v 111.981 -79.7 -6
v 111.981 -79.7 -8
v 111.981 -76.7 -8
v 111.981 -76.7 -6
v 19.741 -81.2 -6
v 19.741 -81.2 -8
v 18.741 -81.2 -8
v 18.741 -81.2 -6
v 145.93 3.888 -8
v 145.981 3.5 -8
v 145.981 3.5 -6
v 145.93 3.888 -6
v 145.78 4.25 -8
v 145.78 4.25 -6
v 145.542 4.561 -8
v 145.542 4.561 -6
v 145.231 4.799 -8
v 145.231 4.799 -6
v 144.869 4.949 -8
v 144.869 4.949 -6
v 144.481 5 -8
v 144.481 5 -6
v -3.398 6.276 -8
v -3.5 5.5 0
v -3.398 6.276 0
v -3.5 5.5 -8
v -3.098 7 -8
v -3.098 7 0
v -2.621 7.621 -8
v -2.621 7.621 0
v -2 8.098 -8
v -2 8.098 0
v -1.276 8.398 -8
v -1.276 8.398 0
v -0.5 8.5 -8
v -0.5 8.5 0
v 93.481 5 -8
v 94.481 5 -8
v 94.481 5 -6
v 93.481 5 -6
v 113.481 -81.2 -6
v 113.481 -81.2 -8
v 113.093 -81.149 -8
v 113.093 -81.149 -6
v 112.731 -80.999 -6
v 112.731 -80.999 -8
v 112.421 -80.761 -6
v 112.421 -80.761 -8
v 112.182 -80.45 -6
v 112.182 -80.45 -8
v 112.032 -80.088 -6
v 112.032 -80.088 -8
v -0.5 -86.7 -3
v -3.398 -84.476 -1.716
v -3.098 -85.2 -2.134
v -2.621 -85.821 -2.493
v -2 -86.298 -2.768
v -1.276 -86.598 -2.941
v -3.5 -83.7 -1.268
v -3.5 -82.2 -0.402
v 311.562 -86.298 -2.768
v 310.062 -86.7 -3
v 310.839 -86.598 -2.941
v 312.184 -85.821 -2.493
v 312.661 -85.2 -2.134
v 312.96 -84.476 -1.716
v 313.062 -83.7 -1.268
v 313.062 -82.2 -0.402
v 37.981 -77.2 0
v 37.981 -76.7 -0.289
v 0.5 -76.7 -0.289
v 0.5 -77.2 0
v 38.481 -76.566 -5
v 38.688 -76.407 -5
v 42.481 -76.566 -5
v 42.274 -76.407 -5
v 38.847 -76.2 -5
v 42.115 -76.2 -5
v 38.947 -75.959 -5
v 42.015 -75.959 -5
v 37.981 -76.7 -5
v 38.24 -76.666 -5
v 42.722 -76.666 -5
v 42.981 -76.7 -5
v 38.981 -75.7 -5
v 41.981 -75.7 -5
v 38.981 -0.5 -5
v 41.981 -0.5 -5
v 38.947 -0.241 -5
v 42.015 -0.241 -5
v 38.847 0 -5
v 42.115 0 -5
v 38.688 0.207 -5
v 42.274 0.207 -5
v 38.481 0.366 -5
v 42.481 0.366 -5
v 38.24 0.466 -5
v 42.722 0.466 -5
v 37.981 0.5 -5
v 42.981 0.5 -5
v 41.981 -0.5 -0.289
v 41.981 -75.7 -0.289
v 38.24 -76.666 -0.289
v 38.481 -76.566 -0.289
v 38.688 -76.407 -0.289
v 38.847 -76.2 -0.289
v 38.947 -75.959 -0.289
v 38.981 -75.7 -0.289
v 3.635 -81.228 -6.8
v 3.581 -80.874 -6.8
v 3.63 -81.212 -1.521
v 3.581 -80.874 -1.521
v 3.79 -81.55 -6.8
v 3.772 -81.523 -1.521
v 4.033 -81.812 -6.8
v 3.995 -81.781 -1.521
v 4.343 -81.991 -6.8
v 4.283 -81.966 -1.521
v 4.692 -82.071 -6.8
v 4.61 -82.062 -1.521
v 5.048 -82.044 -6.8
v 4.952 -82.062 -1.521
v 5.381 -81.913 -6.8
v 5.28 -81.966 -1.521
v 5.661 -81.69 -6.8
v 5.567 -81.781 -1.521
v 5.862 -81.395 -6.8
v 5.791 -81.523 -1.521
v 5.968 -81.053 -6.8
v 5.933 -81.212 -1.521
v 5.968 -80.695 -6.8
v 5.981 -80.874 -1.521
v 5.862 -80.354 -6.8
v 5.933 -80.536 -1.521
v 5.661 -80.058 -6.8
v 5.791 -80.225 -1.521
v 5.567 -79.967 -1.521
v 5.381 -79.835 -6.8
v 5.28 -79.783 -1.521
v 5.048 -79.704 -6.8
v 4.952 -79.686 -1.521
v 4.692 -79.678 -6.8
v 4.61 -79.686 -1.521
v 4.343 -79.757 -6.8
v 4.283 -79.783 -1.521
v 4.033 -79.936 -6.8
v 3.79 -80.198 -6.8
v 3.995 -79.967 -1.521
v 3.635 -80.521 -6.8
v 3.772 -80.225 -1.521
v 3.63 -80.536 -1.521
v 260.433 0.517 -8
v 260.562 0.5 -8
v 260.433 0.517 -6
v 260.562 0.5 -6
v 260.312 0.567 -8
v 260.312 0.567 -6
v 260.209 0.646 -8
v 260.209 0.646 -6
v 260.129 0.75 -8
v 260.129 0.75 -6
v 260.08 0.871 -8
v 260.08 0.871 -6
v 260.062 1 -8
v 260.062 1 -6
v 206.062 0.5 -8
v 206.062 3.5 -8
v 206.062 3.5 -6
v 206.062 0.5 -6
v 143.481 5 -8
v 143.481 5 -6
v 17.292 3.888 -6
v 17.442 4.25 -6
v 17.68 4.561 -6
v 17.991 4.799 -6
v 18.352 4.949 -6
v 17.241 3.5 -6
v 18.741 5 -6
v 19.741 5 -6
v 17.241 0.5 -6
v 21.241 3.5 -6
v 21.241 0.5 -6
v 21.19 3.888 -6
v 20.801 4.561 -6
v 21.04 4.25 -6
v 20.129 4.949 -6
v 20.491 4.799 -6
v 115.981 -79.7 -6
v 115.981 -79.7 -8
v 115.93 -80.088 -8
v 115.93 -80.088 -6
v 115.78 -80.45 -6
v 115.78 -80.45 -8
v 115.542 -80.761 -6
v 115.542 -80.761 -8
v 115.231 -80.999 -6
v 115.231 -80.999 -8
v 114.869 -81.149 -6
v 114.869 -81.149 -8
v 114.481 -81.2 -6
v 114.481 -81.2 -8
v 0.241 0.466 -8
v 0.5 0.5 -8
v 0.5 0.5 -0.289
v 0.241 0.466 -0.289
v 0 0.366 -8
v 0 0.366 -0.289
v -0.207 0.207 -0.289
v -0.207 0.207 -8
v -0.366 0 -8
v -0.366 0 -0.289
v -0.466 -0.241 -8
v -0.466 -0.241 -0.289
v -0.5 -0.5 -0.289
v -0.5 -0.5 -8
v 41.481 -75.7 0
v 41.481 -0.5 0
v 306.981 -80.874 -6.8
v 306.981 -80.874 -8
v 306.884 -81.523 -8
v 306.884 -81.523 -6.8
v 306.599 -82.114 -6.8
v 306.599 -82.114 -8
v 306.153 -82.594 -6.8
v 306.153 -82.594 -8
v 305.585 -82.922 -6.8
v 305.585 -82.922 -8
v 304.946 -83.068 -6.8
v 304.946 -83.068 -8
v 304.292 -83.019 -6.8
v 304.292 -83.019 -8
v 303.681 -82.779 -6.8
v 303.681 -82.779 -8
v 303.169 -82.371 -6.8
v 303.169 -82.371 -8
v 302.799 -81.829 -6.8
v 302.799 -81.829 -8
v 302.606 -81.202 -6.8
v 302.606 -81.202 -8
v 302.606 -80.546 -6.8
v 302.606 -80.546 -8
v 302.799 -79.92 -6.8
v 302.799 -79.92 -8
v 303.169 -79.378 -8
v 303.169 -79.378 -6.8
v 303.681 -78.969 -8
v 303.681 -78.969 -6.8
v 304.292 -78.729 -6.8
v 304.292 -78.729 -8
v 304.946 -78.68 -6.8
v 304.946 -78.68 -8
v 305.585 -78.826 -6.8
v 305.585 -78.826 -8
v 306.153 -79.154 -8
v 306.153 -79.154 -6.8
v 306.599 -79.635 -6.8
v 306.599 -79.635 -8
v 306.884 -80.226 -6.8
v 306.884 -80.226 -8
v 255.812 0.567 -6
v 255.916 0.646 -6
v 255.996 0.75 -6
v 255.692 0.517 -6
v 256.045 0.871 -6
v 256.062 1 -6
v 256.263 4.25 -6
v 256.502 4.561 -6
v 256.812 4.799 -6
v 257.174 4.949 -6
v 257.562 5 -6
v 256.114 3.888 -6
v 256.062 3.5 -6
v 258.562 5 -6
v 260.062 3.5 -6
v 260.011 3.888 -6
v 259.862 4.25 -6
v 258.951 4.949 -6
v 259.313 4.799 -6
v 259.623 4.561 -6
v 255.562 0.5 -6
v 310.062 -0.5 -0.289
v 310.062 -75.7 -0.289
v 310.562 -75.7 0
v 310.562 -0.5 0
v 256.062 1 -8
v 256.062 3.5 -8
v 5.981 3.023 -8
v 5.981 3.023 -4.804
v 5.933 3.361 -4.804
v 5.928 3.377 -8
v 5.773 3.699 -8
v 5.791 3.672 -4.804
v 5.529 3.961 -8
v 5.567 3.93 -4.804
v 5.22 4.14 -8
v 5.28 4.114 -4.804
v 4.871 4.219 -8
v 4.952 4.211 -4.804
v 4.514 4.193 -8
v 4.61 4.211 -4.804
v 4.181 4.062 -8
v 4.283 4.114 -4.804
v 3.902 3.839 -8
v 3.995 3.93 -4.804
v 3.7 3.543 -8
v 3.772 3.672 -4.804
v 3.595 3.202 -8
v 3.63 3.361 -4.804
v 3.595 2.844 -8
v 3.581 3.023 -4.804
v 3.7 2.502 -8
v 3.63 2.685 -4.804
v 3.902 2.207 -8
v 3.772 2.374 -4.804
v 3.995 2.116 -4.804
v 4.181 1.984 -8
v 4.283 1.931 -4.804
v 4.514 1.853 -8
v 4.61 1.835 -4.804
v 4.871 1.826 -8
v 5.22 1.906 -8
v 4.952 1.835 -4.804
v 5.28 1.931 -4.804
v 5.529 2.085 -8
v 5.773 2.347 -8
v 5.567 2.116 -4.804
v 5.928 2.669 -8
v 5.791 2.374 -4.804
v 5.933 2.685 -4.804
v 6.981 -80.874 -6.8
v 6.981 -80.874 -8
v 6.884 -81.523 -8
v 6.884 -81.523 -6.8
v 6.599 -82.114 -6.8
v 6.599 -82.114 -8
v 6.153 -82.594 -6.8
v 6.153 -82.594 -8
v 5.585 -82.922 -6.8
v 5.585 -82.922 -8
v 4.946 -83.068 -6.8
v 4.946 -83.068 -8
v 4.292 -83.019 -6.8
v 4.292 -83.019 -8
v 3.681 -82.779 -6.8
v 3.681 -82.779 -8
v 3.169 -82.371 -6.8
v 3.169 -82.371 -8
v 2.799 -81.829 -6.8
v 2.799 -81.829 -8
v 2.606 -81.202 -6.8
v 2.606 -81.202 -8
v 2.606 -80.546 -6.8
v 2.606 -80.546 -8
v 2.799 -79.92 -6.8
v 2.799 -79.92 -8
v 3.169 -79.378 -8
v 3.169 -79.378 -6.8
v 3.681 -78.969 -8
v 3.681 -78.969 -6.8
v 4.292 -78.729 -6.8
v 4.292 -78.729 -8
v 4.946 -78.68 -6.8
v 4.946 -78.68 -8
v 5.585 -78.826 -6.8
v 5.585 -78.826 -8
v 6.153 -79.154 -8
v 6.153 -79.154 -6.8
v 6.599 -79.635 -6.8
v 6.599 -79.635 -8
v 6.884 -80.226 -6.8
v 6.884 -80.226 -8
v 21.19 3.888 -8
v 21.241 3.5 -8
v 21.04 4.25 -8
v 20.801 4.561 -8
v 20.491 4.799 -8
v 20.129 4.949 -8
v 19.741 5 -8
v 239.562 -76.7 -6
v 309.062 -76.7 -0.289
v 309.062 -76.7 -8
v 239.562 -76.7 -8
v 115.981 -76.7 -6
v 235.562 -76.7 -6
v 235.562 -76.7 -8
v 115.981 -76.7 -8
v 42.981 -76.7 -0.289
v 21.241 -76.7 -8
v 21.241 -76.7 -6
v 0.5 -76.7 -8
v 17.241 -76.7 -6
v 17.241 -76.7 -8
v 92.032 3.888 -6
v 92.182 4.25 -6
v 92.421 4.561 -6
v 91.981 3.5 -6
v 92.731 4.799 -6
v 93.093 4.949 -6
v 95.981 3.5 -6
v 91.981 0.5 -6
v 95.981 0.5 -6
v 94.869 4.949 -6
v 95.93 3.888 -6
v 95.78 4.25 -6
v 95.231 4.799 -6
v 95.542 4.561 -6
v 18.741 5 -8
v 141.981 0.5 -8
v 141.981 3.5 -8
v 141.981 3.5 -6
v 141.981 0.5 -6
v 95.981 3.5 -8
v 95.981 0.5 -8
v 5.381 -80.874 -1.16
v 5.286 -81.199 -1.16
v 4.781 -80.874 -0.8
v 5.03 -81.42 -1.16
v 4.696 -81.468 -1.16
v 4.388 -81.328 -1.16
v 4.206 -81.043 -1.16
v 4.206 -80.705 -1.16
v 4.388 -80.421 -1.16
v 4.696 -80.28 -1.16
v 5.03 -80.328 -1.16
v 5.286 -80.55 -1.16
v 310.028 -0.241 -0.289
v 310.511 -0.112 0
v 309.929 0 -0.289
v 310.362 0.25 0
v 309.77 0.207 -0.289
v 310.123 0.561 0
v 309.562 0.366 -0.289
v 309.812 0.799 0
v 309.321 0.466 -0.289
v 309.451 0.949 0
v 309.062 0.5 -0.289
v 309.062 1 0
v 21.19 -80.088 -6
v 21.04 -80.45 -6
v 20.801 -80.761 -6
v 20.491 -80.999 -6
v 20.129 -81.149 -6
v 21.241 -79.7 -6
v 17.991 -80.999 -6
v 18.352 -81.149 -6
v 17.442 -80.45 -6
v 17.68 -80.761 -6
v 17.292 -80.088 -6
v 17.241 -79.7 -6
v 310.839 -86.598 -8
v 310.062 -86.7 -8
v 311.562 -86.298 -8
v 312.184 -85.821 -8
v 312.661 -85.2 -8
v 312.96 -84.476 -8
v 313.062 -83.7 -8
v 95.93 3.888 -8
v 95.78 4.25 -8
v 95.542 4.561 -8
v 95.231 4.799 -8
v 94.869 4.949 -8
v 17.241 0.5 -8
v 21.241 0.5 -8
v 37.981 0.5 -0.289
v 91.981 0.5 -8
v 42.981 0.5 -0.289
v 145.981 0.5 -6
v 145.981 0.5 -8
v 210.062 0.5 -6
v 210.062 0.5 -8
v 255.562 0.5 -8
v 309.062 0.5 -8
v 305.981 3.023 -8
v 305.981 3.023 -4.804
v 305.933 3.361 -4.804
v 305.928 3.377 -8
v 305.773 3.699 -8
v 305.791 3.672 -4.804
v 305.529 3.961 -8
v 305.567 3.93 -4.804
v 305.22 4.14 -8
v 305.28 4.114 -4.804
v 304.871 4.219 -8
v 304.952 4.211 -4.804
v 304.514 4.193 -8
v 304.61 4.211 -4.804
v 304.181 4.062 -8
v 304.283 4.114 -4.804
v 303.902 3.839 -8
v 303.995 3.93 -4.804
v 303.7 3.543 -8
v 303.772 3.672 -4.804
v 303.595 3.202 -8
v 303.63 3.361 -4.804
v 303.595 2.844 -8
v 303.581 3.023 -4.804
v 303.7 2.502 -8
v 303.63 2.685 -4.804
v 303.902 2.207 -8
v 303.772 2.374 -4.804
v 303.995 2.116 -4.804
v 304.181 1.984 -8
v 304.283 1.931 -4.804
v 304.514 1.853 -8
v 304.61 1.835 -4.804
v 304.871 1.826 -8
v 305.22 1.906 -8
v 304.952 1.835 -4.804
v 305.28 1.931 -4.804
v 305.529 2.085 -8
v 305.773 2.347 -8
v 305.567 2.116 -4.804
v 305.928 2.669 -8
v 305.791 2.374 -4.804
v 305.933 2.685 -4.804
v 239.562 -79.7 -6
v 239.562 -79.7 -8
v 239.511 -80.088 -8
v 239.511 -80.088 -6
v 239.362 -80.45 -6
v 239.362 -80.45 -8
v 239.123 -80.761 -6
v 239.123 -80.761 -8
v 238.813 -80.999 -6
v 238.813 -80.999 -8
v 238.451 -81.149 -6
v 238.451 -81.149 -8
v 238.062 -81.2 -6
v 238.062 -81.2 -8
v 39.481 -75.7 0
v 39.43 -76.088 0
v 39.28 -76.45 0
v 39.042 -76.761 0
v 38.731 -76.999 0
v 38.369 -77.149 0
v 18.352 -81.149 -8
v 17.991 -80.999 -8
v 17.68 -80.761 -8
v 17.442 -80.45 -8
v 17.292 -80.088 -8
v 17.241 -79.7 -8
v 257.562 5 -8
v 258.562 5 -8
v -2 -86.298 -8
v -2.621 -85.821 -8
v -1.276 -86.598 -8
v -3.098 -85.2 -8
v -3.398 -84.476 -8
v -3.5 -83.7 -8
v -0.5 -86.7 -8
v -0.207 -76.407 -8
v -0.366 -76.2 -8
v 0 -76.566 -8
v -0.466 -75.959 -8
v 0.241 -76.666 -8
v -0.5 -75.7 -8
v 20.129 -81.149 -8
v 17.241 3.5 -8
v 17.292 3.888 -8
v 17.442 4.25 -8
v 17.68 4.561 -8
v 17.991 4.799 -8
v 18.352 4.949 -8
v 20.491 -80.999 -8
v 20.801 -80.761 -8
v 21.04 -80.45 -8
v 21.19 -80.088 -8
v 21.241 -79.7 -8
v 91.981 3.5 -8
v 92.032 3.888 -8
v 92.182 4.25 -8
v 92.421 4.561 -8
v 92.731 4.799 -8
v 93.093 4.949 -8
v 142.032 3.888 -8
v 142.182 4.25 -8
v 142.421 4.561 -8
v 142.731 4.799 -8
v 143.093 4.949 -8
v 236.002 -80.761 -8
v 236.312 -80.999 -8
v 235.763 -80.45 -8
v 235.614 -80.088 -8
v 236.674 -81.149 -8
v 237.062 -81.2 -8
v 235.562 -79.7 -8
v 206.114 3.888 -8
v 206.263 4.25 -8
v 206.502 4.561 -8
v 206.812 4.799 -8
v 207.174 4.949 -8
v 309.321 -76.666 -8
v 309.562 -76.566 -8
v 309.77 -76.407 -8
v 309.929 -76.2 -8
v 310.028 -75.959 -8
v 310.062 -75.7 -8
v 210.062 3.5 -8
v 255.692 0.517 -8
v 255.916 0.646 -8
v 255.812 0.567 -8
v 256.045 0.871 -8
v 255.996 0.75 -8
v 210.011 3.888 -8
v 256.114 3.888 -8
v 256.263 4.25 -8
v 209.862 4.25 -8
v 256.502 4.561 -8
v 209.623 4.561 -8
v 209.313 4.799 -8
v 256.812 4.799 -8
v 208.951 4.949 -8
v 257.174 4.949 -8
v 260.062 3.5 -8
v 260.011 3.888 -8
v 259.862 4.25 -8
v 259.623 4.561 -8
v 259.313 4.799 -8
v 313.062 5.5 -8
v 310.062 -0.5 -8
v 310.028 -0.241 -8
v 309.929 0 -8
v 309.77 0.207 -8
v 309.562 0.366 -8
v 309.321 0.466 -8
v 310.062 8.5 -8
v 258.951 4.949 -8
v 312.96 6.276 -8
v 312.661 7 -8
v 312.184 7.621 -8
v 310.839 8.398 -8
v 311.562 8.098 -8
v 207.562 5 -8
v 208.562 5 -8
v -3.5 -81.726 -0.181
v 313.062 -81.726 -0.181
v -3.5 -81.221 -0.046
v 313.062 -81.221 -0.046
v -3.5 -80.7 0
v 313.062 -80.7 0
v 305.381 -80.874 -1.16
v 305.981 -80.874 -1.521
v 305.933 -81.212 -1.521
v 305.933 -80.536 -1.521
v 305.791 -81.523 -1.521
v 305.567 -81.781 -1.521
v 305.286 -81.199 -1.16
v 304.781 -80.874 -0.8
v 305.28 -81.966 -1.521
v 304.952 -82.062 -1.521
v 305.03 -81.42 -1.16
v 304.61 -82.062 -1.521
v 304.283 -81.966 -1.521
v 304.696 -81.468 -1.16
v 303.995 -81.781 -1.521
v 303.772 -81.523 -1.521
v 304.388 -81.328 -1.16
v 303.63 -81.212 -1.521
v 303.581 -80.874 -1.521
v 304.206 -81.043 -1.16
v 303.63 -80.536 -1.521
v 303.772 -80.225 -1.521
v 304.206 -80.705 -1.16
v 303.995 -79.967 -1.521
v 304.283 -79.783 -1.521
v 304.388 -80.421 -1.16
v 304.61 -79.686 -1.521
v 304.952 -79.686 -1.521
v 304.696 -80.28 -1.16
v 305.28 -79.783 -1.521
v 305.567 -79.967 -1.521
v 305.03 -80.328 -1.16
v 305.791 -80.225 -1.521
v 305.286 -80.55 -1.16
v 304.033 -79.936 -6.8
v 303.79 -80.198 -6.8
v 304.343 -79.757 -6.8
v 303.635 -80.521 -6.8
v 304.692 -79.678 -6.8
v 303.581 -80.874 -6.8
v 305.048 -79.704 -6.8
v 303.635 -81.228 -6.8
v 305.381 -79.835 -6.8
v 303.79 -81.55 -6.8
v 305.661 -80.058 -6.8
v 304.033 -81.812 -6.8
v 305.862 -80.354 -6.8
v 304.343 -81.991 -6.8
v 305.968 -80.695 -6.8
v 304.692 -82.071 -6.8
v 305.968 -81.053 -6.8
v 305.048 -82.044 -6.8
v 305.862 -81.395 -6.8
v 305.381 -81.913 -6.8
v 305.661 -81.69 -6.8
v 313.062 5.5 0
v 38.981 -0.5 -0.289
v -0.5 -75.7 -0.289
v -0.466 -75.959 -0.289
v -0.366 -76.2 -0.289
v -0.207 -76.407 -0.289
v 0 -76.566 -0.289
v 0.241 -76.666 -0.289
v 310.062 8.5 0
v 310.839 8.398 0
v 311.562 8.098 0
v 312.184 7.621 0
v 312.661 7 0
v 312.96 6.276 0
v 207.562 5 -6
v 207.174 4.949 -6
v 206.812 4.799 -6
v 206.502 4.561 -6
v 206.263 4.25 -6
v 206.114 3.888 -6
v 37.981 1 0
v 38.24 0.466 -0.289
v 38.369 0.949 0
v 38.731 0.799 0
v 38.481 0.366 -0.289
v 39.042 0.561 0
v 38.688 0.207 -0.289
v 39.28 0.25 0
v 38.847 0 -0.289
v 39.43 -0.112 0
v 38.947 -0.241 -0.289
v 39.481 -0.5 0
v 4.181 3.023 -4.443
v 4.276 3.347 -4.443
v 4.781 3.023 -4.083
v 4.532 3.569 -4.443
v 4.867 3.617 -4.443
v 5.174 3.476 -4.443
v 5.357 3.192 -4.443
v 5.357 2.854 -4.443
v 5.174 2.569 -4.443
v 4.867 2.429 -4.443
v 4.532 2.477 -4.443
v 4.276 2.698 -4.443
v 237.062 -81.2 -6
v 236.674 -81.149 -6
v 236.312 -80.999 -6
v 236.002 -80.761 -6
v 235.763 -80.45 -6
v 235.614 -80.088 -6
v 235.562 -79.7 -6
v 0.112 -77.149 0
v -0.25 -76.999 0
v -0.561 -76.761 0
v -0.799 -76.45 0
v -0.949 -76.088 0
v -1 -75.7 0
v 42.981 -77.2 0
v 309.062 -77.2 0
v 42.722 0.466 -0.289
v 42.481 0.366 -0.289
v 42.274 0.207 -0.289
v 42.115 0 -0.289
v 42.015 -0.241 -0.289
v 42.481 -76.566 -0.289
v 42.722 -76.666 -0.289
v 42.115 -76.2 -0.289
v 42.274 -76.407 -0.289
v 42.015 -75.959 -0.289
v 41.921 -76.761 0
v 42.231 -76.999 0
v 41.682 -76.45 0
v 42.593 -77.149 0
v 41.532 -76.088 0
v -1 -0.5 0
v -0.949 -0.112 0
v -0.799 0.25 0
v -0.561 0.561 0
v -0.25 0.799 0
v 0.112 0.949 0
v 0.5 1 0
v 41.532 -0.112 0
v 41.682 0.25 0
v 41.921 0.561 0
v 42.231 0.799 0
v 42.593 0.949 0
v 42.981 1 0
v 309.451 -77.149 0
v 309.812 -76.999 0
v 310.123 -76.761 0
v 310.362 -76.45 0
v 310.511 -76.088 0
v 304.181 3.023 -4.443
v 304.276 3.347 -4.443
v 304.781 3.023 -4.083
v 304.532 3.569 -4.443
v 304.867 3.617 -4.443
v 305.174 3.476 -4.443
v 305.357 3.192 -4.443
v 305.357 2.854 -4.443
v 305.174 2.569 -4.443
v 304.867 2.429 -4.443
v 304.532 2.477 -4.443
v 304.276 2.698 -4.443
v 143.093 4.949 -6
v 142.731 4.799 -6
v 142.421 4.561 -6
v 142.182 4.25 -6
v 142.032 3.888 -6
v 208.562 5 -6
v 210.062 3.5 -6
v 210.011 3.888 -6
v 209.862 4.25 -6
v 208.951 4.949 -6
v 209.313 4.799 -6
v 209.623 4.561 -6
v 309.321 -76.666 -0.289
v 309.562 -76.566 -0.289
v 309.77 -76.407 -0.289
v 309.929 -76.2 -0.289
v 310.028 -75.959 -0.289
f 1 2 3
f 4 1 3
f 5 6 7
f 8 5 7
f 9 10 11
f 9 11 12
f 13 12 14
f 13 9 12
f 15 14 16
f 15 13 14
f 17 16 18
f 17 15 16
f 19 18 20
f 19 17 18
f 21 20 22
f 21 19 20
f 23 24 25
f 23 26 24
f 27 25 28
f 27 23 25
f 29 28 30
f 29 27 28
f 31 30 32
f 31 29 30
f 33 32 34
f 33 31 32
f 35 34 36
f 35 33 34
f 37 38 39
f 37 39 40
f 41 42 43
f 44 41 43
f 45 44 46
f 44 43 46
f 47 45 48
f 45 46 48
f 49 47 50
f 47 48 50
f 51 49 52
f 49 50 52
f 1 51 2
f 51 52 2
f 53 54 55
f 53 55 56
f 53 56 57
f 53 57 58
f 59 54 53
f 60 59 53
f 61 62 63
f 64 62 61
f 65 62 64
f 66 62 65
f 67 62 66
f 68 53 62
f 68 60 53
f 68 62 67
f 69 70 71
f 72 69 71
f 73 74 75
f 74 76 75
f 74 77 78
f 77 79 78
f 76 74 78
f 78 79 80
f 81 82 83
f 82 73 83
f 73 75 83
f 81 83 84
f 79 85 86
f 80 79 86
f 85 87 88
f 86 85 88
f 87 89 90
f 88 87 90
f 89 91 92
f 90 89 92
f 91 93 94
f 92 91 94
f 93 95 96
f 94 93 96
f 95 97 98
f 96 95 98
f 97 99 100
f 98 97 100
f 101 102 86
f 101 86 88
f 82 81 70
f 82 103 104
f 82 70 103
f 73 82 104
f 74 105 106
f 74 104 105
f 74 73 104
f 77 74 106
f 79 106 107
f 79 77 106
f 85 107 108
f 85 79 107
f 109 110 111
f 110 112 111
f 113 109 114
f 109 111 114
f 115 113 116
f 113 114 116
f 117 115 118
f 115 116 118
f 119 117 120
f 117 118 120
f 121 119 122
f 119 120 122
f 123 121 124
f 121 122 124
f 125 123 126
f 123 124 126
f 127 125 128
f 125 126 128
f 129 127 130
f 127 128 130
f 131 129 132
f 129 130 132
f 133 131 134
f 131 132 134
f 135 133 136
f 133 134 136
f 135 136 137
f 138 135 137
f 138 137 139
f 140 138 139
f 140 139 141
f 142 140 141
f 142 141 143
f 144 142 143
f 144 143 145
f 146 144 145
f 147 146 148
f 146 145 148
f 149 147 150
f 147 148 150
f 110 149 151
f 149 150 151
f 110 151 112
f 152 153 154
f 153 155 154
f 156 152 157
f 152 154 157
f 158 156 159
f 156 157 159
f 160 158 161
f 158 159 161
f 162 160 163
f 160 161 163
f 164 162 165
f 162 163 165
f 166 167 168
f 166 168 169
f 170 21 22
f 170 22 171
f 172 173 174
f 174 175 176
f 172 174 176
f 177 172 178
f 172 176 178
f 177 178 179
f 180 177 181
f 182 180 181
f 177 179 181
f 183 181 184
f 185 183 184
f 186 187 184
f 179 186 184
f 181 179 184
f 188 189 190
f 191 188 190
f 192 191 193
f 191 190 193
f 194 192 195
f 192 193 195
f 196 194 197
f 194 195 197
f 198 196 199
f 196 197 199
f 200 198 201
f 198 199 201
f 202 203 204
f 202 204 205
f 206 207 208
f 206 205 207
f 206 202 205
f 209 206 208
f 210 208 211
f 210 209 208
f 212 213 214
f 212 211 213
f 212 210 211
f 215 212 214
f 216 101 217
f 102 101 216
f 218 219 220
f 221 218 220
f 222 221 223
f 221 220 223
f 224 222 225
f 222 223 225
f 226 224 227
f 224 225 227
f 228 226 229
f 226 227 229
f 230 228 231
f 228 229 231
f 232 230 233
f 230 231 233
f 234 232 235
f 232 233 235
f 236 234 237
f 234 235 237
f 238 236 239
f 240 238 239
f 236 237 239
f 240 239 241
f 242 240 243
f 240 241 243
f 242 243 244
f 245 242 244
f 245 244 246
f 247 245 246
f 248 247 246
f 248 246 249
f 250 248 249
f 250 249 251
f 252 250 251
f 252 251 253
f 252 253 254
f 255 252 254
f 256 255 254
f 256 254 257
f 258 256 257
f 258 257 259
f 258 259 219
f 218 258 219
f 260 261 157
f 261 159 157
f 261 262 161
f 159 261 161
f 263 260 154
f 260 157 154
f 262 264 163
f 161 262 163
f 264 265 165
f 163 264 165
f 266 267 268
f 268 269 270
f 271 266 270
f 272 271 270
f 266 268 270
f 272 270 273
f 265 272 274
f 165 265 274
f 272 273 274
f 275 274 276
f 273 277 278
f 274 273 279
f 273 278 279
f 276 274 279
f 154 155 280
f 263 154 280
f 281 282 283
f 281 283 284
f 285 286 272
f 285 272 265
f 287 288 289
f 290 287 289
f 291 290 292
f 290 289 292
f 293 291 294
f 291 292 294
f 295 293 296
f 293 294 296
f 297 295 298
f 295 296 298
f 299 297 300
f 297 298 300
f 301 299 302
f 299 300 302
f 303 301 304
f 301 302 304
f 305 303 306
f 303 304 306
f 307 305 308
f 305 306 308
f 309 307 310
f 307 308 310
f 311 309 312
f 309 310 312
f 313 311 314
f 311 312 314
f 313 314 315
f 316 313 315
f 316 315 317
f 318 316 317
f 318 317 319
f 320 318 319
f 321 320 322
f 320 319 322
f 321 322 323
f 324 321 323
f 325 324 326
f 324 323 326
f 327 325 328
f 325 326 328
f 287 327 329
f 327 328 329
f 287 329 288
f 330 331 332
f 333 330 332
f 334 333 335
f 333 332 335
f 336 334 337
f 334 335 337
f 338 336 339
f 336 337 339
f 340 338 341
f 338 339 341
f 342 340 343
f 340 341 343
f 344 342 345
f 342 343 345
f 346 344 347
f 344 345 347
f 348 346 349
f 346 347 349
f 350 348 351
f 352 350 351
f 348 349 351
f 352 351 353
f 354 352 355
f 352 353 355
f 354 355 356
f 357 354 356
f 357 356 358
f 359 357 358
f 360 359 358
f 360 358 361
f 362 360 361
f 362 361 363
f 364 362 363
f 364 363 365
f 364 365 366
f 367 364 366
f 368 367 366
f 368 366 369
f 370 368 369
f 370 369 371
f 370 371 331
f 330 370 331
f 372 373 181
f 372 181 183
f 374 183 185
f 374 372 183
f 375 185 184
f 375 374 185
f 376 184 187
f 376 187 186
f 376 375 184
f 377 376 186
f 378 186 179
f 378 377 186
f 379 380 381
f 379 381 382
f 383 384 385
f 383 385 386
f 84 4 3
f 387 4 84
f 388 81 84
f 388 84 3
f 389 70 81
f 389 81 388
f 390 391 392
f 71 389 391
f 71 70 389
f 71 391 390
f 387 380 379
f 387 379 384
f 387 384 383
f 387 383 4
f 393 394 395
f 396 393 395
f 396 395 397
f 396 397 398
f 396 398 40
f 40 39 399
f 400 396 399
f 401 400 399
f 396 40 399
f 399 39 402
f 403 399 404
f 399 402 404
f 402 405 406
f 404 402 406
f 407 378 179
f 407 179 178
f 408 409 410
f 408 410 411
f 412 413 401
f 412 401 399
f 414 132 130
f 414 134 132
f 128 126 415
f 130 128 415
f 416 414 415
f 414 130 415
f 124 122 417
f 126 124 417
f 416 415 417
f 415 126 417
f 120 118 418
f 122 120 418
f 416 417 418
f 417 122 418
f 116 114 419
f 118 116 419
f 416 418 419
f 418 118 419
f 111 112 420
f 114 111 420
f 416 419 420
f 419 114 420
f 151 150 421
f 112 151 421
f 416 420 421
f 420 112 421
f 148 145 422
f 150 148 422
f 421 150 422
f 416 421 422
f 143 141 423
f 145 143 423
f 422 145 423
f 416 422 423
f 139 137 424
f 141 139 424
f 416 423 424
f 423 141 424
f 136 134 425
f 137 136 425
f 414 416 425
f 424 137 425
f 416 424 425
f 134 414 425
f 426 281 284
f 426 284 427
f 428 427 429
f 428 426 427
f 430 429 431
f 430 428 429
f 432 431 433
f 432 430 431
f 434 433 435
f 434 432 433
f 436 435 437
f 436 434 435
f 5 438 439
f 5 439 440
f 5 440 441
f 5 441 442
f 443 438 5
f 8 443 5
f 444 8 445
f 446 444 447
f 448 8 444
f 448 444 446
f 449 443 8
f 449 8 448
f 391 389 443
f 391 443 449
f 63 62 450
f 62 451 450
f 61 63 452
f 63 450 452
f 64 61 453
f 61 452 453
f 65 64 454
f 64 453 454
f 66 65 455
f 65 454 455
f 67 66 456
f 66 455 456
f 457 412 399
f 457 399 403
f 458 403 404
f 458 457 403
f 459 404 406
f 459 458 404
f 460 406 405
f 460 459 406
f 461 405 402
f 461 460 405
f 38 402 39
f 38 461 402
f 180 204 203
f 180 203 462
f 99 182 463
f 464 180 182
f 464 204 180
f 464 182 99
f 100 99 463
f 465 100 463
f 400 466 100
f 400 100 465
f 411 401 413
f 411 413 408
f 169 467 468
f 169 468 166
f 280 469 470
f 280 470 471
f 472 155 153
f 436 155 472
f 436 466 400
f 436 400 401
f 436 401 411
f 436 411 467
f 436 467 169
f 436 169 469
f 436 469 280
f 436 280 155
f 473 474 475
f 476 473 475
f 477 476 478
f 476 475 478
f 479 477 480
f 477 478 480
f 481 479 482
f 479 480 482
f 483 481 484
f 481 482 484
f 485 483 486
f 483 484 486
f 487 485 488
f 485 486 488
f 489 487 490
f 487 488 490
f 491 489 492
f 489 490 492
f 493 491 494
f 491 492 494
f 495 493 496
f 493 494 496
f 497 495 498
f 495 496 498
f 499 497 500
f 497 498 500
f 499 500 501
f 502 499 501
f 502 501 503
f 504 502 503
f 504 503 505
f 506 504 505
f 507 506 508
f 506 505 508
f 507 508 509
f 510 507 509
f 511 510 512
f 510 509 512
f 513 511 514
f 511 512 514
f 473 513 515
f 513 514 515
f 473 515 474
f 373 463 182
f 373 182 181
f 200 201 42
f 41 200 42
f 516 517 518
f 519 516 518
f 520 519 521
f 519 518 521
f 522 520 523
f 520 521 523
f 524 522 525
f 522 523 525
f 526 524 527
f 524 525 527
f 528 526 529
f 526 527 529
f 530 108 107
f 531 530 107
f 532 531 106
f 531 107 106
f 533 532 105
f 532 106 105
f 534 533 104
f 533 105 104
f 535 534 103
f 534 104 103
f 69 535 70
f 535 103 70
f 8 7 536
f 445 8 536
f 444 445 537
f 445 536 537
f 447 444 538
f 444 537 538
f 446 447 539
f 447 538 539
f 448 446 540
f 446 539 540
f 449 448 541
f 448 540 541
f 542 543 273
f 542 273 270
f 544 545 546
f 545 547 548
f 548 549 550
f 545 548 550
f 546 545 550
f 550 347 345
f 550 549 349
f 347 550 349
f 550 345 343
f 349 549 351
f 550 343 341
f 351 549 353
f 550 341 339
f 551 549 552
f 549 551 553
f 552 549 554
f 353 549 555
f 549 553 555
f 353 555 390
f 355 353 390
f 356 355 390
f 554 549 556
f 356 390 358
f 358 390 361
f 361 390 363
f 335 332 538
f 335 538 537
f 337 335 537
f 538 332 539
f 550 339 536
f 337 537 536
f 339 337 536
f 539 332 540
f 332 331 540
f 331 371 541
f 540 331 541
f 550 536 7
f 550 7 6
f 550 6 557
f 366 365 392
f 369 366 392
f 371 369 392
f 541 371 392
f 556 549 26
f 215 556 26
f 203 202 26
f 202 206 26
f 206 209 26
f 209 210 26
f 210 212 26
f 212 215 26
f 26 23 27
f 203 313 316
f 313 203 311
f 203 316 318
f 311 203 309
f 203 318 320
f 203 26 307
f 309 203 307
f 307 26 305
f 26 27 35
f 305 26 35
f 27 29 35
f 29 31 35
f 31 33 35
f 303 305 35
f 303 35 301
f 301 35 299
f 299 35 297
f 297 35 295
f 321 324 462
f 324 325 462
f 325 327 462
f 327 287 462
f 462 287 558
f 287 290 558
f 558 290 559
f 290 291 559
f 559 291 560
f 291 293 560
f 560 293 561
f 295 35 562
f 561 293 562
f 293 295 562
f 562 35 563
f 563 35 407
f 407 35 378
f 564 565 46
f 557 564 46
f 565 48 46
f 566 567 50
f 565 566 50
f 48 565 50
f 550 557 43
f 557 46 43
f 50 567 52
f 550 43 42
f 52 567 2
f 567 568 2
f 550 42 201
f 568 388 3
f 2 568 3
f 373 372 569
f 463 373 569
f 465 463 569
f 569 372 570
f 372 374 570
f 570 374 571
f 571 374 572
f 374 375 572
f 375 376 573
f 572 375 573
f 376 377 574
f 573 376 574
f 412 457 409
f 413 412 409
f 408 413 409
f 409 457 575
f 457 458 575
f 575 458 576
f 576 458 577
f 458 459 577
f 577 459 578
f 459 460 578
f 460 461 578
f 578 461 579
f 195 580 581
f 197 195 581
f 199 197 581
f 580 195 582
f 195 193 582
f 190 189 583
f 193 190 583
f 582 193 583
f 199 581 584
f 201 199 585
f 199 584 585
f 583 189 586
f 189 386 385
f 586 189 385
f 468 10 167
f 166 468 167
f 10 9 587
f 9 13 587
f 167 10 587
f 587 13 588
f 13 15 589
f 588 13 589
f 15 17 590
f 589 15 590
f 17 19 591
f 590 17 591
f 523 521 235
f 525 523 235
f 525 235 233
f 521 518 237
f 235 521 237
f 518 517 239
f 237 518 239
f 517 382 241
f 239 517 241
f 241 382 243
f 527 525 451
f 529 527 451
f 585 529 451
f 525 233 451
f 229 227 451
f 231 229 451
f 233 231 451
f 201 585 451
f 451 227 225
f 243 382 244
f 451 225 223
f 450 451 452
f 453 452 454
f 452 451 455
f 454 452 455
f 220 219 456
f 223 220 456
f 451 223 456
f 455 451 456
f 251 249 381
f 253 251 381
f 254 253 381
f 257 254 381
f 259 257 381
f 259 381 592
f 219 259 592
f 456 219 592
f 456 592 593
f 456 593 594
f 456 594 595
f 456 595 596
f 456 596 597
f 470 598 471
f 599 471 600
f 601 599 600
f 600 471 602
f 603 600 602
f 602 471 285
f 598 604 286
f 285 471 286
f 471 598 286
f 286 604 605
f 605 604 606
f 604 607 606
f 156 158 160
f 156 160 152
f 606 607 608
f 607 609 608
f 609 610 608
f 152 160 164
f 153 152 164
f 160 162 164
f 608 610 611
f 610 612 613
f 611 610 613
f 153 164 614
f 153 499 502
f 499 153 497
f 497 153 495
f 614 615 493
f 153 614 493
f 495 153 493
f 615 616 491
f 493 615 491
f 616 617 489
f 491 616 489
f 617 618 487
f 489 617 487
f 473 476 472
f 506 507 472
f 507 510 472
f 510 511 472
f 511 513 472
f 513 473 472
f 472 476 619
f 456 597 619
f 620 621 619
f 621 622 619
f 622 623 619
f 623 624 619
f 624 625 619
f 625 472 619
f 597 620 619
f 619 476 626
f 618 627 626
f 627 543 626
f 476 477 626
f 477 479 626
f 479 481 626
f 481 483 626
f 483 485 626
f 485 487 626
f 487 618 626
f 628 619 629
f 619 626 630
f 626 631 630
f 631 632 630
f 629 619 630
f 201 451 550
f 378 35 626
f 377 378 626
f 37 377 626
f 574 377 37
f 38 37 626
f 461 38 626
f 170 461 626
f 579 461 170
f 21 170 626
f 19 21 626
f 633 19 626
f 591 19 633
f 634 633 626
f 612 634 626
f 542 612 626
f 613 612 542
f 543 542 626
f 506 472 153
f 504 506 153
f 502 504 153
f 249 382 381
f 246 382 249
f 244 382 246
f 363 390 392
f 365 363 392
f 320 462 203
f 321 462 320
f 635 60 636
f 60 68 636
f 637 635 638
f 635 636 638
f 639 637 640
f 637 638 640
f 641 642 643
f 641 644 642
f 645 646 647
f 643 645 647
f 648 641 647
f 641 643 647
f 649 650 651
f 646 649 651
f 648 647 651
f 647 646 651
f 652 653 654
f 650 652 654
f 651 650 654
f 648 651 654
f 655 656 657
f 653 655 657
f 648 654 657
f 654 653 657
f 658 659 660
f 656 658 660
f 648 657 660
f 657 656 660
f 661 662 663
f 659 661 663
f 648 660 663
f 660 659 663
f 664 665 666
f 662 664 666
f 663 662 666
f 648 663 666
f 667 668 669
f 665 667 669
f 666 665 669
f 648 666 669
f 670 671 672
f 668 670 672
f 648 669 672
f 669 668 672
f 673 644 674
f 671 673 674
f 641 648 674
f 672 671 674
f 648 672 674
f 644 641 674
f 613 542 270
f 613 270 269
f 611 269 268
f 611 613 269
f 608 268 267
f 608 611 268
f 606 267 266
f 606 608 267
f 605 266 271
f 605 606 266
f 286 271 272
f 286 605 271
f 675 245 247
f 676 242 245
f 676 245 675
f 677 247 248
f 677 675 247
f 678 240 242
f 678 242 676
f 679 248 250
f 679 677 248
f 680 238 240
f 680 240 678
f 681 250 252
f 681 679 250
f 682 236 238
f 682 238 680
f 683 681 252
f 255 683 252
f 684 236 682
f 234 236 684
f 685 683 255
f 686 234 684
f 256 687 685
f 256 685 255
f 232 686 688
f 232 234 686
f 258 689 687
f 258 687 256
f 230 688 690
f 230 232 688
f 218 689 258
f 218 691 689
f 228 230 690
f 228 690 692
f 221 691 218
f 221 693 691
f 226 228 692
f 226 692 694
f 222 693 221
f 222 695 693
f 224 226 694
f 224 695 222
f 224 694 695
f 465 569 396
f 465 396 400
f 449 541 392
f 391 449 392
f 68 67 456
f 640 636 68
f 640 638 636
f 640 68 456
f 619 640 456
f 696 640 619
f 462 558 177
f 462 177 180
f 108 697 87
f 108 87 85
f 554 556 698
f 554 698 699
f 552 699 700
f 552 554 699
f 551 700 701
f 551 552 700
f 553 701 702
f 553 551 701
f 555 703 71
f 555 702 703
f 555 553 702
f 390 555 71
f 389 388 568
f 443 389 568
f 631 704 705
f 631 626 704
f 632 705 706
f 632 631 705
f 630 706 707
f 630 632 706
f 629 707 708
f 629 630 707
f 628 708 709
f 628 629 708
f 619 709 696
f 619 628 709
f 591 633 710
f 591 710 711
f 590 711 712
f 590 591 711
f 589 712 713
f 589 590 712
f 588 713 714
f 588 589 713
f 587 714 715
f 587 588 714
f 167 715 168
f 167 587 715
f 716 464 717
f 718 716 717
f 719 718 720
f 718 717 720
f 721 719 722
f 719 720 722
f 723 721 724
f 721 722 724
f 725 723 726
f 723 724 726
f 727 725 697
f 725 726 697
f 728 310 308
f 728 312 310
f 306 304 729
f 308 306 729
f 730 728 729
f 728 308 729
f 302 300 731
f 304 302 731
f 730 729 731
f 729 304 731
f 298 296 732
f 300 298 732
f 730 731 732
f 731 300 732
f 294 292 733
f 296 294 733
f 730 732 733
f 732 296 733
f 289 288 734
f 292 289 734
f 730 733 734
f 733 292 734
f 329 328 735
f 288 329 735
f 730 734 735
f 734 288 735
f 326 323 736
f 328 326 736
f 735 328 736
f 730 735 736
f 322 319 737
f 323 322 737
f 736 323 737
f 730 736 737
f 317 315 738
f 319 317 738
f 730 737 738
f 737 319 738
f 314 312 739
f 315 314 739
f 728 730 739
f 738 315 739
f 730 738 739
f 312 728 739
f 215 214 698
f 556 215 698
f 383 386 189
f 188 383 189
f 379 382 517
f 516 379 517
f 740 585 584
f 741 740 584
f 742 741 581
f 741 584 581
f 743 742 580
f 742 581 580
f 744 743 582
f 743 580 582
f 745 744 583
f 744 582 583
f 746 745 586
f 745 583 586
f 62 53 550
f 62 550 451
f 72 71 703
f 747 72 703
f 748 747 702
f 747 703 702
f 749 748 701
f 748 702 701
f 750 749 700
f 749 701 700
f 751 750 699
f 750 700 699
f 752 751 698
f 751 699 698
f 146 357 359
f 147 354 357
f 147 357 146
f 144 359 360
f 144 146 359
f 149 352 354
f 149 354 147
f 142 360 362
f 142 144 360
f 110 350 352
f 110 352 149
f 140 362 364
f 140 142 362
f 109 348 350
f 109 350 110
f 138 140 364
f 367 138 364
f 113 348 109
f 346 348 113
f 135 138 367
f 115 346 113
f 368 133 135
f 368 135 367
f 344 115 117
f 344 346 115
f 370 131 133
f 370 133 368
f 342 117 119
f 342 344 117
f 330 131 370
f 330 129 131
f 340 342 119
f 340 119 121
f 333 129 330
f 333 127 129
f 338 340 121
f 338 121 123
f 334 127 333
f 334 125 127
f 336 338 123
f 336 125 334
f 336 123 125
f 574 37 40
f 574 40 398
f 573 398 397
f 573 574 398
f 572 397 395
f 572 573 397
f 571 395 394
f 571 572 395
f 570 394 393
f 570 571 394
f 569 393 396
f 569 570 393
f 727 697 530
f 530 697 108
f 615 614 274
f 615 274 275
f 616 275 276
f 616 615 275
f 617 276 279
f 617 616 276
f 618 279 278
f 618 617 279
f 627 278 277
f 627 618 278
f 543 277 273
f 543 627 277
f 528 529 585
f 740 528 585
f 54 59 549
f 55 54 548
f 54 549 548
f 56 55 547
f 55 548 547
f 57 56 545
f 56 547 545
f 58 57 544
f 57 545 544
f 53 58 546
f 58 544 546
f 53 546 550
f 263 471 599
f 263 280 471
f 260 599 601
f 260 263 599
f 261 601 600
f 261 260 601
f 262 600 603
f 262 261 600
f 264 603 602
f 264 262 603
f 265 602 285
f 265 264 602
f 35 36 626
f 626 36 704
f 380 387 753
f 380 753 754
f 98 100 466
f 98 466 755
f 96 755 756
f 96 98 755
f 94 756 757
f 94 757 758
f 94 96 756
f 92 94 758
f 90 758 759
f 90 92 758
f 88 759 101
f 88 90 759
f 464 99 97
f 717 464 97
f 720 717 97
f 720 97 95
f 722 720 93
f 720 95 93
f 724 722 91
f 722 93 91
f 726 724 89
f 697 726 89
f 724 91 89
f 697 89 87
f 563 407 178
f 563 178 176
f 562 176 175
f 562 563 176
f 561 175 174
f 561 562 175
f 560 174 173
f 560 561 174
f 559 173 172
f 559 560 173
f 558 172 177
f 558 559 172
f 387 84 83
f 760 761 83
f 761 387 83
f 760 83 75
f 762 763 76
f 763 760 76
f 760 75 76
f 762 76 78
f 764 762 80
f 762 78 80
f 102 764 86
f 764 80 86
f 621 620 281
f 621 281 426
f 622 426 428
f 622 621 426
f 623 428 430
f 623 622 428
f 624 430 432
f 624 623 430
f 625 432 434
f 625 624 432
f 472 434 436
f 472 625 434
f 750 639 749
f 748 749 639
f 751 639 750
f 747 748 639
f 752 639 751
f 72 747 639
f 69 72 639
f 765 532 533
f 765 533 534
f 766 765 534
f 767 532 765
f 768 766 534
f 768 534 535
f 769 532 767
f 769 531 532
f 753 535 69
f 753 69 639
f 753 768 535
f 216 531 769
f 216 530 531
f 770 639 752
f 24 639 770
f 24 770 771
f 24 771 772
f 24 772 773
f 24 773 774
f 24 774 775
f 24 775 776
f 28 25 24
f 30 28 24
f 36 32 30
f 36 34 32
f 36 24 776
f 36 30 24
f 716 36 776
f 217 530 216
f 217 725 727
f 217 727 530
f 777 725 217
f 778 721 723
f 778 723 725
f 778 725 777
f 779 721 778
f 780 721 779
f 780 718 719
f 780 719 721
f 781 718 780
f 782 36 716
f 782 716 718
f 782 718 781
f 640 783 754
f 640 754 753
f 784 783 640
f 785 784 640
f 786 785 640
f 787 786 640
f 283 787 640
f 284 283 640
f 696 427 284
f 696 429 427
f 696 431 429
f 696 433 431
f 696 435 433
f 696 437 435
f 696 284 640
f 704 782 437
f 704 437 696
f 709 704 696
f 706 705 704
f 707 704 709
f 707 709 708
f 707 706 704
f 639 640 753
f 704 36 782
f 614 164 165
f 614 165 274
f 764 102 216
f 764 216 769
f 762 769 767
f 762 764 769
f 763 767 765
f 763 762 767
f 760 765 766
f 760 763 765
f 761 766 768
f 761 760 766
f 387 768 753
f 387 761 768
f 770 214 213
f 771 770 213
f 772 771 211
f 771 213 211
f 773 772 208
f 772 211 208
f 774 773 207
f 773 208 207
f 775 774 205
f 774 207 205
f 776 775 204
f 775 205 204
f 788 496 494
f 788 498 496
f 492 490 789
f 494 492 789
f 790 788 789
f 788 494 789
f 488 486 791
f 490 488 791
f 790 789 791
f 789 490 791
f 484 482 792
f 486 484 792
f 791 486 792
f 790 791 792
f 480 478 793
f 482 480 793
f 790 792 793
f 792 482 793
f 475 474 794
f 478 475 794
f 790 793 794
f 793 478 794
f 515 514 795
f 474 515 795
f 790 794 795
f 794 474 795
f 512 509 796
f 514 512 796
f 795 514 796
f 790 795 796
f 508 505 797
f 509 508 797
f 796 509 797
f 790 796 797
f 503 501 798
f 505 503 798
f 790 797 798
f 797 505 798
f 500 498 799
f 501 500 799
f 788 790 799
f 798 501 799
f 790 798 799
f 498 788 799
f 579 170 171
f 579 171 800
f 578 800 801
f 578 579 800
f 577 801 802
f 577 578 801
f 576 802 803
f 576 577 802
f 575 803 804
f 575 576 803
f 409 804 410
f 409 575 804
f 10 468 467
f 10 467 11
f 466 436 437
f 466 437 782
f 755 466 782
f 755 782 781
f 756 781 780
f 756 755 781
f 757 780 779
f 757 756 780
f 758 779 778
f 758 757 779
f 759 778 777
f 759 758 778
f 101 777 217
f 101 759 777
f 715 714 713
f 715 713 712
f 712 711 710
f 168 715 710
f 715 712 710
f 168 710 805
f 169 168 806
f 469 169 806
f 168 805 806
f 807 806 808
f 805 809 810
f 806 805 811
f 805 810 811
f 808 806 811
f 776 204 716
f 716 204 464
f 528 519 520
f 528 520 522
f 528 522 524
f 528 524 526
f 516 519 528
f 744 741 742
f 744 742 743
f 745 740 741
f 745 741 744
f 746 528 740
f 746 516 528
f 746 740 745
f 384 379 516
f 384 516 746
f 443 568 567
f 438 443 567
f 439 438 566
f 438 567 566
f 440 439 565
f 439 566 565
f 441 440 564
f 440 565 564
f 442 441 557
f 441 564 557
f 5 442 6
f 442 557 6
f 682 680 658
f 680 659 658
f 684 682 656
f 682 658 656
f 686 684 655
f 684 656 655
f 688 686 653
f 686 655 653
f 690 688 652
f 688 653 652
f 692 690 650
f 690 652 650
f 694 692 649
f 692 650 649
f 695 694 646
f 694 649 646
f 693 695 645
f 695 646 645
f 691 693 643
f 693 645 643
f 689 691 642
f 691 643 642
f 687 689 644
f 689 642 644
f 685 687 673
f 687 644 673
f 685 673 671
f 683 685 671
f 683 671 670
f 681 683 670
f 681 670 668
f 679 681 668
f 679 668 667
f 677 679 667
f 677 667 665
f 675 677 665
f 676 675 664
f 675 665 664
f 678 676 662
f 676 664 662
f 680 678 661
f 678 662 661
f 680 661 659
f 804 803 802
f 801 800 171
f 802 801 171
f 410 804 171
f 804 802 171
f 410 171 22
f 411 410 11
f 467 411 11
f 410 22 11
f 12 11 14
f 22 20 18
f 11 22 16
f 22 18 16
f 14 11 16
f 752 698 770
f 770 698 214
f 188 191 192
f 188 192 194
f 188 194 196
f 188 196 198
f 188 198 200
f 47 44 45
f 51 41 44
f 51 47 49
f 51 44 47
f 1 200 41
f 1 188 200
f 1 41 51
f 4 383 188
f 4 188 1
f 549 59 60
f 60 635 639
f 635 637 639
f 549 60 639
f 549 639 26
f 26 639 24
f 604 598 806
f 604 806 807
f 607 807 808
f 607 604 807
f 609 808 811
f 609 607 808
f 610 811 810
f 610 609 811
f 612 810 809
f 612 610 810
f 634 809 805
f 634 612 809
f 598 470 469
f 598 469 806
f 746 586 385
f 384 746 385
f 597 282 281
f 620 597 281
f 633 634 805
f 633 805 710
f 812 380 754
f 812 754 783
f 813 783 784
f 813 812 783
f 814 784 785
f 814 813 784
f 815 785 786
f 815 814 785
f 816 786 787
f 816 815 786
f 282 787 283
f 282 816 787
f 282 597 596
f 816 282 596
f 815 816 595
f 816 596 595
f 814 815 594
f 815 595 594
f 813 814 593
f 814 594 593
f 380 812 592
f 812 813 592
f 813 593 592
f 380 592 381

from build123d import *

# Parameters (mm, degrees)
SKETCH3_W                      = 316.5625
SKETCH3_H                      = 95.2
BOSS_EXTRUDE1_DEPTH            = 8
SKETCH3_3_W                    = 3
SKETCH3_3_H                    = 67.175
SKETCH3_3_H_2                  = 10.025
BOSS_EXTRUDE2_DEPTH            = 5
CHAMFER1_SIZE                  = 3
CHAMFER1_SIZE2                 = 5.196152423
FILLET3_R                      = 3
CUT_EXTRUDE1_DEPTH             = 2
FILLET1_R                      = 3
FILLET5_R                      = 1
CHAMFER2_SIZE                  = 0.5
CHAMFER2_SIZE2                 = 0.288675135
FILLET6_R                      = 0.5
CBORE_FOR_M2_SHCS2_D           = 2.4
CBORE_FOR_M2_SHCS2_DEPTH       = 12.278967257
CBORE_FOR_M2_SHCS2_CBORE_D     = 4.4
CBORE_FOR_M2_SHCS2_CBORE_DEPTH = 4
CBORE_FOR_M2_SHCS2_TIP         = 0.721032743
CBORE_FOR_M2_SHCS3_D           = 2.4
CBORE_FOR_M2_SHCS3_DEPTH       = 8.278967257
CBORE_FOR_M2_SHCS3_CBORE_D     = 4.4
CBORE_FOR_M2_SHCS3_CBORE_DEPTH = 3
CBORE_FOR_M2_SHCS3_TIP         = 0.721032743


with BuildPart() as part:
    # Sketch3 → Boss-Extrude1 (new body)
    with BuildSketch(Plane.XY):
        with Locations((154.78125, -39.1)):
            Rectangle(SKETCH3_W, SKETCH3_H)
        Polygon((38.98125, -76.7), (41.98125, -76.7), (310.0625, -76.7), (310.0625, 0.5), (41.98125, 0.5), (38.98125, 0.5), (-0.5, 0.5), (-0.5, -76.7), align=None, mode=Mode.SUBTRACT)
    extrude(amount=-BOSS_EXTRUDE1_DEPTH)

    # Sketch3<3> → Boss-Extrude2 (add)
    with BuildSketch(Plane.XY):
        with Locations((40.48125, -43.1125)):
            Rectangle(SKETCH3_3_W, SKETCH3_3_H)
        with Locations((40.48125, -4.5125)):
            Rectangle(SKETCH3_3_W, SKETCH3_3_H_2)
    extrude(amount=-BOSS_EXTRUDE2_DEPTH)

    # Chamfer1
    chamfer1_edges = [part.edges().sort_by_distance(p)[0] for p in [
        (154.78125, -86.7, 0),
    ]]
    chamfer1_side = [part.faces().sort_by_distance(p)[0] for p in [
        (154.78125, -86.7, -4),
    ]]
    chamfer(chamfer1_edges, length=CHAMFER1_SIZE, length2=CHAMFER1_SIZE2, reference=chamfer1_side[0])

    # Fillet3
    fillet3_edges = [part.edges().sort_by_distance(p)[0] for p in [
        (154.78125, -81.503847577, 0),
    ]]
    fillet(fillet3_edges, radius=FILLET3_R)

    # Sketch8 → Cut-Extrude1 (cut)
    with BuildSketch(Plane(origin=(0, 0, -8), x_dir=(-1, 0, 0), z_dir=(0, 0, -1))):
        with BuildLine():
            Line((-260.0625, 0.5), (-260.0625, 3.5))
            ThreePointArc((-260.0625, 3.5), (-259.623160172, 4.560660172), (-258.5625, 5))
            Line((-258.5625, 5), (-257.5625, 5))
            ThreePointArc((-257.5625, 5), (-256.501839828, 4.560660172), (-256.0625, 3.5))
            Line((-256.0625, 3.5), (-256.0625, 0.5))
            Line((-256.0625, 0.5), (-260.0625, 0.5))
        make_face()
        with BuildLine():
            Line((-115.98125, -76.7), (-115.98125, -79.7))
            ThreePointArc((-115.98125, -79.7), (-115.541910172, -80.760660172), (-114.48125, -81.2))
            Line((-114.48125, -81.2), (-113.48125, -81.2))
            ThreePointArc((-113.48125, -81.2), (-112.420589828, -80.760660172), (-111.98125, -79.7))
            Line((-111.98125, -79.7), (-111.98125, -76.7))
            Line((-111.98125, -76.7), (-115.98125, -76.7))
        make_face()
        with BuildLine():
            Line((-210.0625, 0.5), (-210.0625, 3.5))
            ThreePointArc((-210.0625, 3.5), (-209.623160172, 4.560660172), (-208.5625, 5))
            Line((-208.5625, 5), (-207.5625, 5))
            ThreePointArc((-207.5625, 5), (-206.501839828, 4.560660172), (-206.0625, 3.5))
            Line((-206.0625, 3.5), (-206.0625, 0.5))
            Line((-206.0625, 0.5), (-210.0625, 0.5))
        make_face()
        with BuildLine():
            Line((-145.98125, 0.5), (-145.98125, 3.5))
            ThreePointArc((-145.98125, 3.5), (-145.541910172, 4.560660172), (-144.48125, 5))
            Line((-144.48125, 5), (-143.48125, 5))
            ThreePointArc((-143.48125, 5), (-142.420589828, 4.560660172), (-141.98125, 3.5))
            Line((-141.98125, 3.5), (-141.98125, 0.5))
            Line((-141.98125, 0.5), (-145.98125, 0.5))
        make_face()
        with BuildLine():
            Line((-95.98125, 0.5), (-95.98125, 3.5))
            ThreePointArc((-95.98125, 3.5), (-95.541910172, 4.560660172), (-94.48125, 5))
            Line((-94.48125, 5), (-93.48125, 5))
            ThreePointArc((-93.48125, 5), (-92.420589828, 4.560660172), (-91.98125, 3.5))
            Line((-91.98125, 3.5), (-91.98125, 0.5))
            Line((-91.98125, 0.5), (-95.98125, 0.5))
        make_face()
        with BuildLine():
            Line((-21.240625, 0.5), (-21.240625, 3.5))
            ThreePointArc((-21.240625, 3.5), (-20.801285172, 4.560660172), (-19.740625, 5))
            Line((-19.740625, 5), (-18.740625, 5))
            ThreePointArc((-18.740625, 5), (-17.679964828, 4.560660172), (-17.240625, 3.5))
            Line((-17.240625, 3.5), (-17.240625, 0.5))
            Line((-17.240625, 0.5), (-21.240625, 0.5))
        make_face()
        with BuildLine():
            Line((-239.5625, -76.7), (-239.5625, -79.7))
            ThreePointArc((-239.5625, -79.7), (-239.123160172, -80.760660172), (-238.0625, -81.2))
            Line((-238.0625, -81.2), (-237.0625, -81.2))
            ThreePointArc((-237.0625, -81.2), (-236.001839828, -80.760660172), (-235.5625, -79.7))
            Line((-235.5625, -79.7), (-235.5625, -76.7))
            Line((-235.5625, -76.7), (-239.5625, -76.7))
        make_face()
        with BuildLine():
            Line((-21.240625, -76.7), (-21.240625, -79.7))
            ThreePointArc((-21.240625, -79.7), (-20.801285172, -80.760660172), (-19.740625, -81.2))
            Line((-19.740625, -81.2), (-18.740625, -81.2))
            ThreePointArc((-18.740625, -81.2), (-17.679964828, -80.760660172), (-17.240625, -79.7))
            Line((-17.240625, -79.7), (-17.240625, -76.7))
            Line((-17.240625, -76.7), (-21.240625, -76.7))
        make_face()
    extrude(amount=-CUT_EXTRUDE1_DEPTH, mode=Mode.SUBTRACT)

    # Fillet1
    fillet1_edges = [part.edges().sort_by_distance(p)[0] for p in [
        (313.0625, -86.7, -5.5),
        (-3.5, -86.7, -5.5),
        (-3.5, 8.5, -4),
        (313.0625, 8.5, -4),
    ]]
    fillet(fillet1_edges, radius=FILLET1_R)

    # Fillet5
    fillet5_edges = [part.edges().sort_by_distance(p)[0] for p in [
        (310.0625, -76.7, -4),
        (310.0625, 0.5, -4),
        (-0.5, 0.5, -4),
        (-0.5, -76.7, -4),
        (41.98125, 0.5, -2.5),
        (41.98125, -76.7, -2.5),
        (38.98125, -76.7, -2.5),
        (38.98125, 0.5, -2.5),
    ]]
    fillet(fillet5_edges, radius=FILLET5_R)

    # Chamfer2
    chamfer2_edges = [part.edges().sort_by_distance(p)[0] for p in [
        (310.0625, -38.1, 0),
        (19.240625, -76.7, 0),
        (176.021875, -76.7, 0),
        (176.021875, 0.5, 0),
        (19.240625, 0.5, 0),
        (41.98125, -38.1, 0),
        (38.98125, -38.1, 0),
        (-0.5, -38.1, 0),
        (309.769606781, -76.407106781, 0),
        (309.769606781, 0.207106781, 0),
        (42.274143219, 0.207106781, 0),
        (42.274143219, -76.407106781, 0),
        (38.688356781, -76.407106781, 0),
        (-0.207106781, -76.407106781, 0),
        (-0.207106781, 0.207106781, 0),
        (38.688356781, 0.207106781, 0),
    ]]
    chamfer2_side = [part.faces().sort_by_distance(p)[0] for p in [
        (310.391389733, -38.1, 0),
    ]]
    chamfer(chamfer2_edges, length=CHAMFER2_SIZE, length2=CHAMFER2_SIZE2, reference=chamfer2_side[0])

    # Fillet6
    fillet6_edges = [part.edges().sort_by_distance(p)[0] for p in [
        (256.0625, 0.5, -7),
        (260.0625, 0.5, -7),
    ]]
    fillet(fillet6_edges, radius=FILLET6_R)

    # CBORE for M2 SHCS2
    with Locations(Plane(origin=(0, -0.720708302, -17.082674747), x_dir=(-1, 0, 0), z_dir=(0, 0, -1))):
        with Locations((-304.78125, 3.743540113), (-4.78125, 3.743540113)):
            CounterBoreHole(CBORE_FOR_M2_SHCS2_D / 2, CBORE_FOR_M2_SHCS2_CBORE_D / 2, CBORE_FOR_M2_SHCS2_CBORE_DEPTH, depth=CBORE_FOR_M2_SHCS2_DEPTH)
            with Locations((0, 0, -(CBORE_FOR_M2_SHCS2_DEPTH + CBORE_FOR_M2_SHCS2_TIP / 2))):  # 118° drill point
                Cone(0, CBORE_FOR_M2_SHCS2_D / 2, CBORE_FOR_M2_SHCS2_TIP, mode=Mode.SUBTRACT)

    # CBORE for M2 SHCS3
    with Locations(Plane(origin=(0, 0, -9.799622892), x_dir=(1, 0, 0), z_dir=(0, 0, -1))):
        with Locations((4.78125, 80.87420884), (304.78125, 80.87420884)):
            CounterBoreHole(CBORE_FOR_M2_SHCS3_D / 2, CBORE_FOR_M2_SHCS3_CBORE_D / 2, CBORE_FOR_M2_SHCS3_CBORE_DEPTH, depth=CBORE_FOR_M2_SHCS3_DEPTH)
            with Locations((0, 0, -(CBORE_FOR_M2_SHCS3_DEPTH + CBORE_FOR_M2_SHCS3_TIP / 2))):  # 118° drill point
                Cone(0, CBORE_FOR_M2_SHCS3_D / 2, CBORE_FOR_M2_SHCS3_TIP, mode=Mode.SUBTRACT)


solid = part.part
